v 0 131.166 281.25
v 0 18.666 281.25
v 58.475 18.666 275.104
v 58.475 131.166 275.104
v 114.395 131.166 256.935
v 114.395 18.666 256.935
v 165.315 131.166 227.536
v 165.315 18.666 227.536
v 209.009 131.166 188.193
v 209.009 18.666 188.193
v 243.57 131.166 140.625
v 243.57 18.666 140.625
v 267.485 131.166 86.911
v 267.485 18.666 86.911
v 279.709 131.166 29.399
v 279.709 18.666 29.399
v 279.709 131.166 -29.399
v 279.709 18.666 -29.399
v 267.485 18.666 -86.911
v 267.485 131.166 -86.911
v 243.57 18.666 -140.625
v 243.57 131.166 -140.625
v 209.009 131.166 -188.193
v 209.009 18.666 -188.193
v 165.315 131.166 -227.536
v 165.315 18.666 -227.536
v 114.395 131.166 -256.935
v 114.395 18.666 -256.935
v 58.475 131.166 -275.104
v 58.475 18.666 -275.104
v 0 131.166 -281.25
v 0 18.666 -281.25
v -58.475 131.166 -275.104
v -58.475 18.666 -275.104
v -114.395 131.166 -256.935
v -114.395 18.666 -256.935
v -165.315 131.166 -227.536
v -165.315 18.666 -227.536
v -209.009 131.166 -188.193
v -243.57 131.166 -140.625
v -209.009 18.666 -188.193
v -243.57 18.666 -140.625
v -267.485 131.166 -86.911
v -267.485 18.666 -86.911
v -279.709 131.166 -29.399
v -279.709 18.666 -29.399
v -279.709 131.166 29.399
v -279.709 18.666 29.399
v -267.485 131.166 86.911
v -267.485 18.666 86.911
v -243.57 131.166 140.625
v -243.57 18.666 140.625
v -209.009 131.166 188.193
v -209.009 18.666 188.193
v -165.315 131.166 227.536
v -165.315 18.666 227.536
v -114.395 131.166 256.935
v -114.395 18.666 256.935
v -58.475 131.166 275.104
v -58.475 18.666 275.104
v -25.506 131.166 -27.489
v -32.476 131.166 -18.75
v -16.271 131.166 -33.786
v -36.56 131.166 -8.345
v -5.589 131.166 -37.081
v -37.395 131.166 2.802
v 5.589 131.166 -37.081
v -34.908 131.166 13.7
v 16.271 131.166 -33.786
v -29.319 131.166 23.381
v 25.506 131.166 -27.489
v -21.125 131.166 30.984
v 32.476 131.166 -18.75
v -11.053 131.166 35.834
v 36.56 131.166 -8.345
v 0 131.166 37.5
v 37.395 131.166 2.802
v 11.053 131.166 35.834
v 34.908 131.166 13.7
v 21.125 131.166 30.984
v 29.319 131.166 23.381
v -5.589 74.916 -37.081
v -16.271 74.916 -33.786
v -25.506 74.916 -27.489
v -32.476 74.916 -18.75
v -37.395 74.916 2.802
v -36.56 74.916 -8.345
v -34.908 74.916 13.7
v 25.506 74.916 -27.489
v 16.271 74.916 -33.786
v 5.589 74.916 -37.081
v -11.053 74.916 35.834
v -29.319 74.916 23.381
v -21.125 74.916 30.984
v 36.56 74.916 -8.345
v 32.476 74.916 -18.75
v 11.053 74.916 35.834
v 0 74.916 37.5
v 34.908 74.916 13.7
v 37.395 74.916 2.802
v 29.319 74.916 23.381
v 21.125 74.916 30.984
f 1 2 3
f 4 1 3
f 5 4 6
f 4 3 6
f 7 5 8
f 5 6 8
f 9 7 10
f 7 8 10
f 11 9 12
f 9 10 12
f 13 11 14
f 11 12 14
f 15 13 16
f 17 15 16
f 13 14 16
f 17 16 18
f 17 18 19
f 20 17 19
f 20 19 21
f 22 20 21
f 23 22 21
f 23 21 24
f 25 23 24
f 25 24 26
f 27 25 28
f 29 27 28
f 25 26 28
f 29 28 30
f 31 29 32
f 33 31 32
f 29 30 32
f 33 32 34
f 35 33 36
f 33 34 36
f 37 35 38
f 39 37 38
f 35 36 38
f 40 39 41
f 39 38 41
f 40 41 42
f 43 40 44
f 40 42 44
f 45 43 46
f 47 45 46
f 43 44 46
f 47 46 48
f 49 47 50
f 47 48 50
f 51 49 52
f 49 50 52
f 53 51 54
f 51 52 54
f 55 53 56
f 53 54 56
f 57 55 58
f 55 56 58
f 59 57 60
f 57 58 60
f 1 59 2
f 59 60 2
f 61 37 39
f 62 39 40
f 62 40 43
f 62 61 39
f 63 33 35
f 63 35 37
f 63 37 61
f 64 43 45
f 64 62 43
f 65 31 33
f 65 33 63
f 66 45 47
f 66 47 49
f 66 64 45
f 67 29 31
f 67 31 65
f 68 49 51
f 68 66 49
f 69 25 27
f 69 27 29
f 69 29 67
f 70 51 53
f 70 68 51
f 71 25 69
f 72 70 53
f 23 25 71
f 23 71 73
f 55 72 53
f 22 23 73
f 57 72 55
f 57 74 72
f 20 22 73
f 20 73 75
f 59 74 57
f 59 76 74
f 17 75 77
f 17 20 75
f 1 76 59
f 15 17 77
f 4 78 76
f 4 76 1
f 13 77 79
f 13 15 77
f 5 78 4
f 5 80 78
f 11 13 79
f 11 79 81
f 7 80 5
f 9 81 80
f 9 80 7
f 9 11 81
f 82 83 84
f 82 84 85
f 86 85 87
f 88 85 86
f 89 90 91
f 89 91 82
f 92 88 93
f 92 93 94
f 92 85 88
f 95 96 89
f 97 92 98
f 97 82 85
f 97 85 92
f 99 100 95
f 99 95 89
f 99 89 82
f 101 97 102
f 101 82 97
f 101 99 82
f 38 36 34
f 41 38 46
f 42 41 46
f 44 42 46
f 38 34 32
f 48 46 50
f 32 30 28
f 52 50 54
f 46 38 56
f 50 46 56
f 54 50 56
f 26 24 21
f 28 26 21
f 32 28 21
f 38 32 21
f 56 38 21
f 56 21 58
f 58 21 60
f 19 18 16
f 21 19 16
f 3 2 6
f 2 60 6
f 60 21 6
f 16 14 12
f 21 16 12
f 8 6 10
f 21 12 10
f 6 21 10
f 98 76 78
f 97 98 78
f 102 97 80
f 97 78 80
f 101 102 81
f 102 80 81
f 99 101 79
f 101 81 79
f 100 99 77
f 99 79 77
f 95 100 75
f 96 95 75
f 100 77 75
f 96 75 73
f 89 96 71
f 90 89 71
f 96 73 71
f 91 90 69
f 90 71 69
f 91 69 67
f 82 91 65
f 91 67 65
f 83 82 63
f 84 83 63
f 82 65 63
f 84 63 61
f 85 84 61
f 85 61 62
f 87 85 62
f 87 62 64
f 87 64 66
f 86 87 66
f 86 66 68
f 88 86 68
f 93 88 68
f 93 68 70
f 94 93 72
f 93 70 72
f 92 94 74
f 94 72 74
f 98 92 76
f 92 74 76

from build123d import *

# Parameters (mm, degrees)
SKETCH1_R           = 375
BOSS_EXTRUDE1_DEPTH = 150
SKETCH2_R           = 50
CUT_EXTRUDE1_DEPTH  = 75
SCALE1_SCALE        = 0.75


with BuildPart() as part:
    # Sketch1 → Boss-Extrude1 (new body)
    with BuildSketch(Plane(origin=(0, 0, 0), x_dir=(1, 0, 0), z_dir=(0, 1, 0))):
        with Locations(Location((0, 0, 0), (0, 0, 270))):
            Circle(SKETCH1_R)
    extrude(amount=BOSS_EXTRUDE1_DEPTH)

    # Sketch2 → Cut-Extrude1 (cut)
    with BuildSketch(Plane(origin=(0, 150, 0), x_dir=(1, 0, 0), z_dir=(0, 1, 0))):
        with Locations(Location((0, 0, 0), (0, 0, 270))):
            Circle(SKETCH2_R)
    extrude(amount=-CUT_EXTRUDE1_DEPTH, mode=Mode.SUBTRACT)


with BuildPart() as part_1:
    # Scale1: scaled about (0, 74.66367713, 0)
    add(part.part.scale(SCALE1_SCALE).moved(Location((0, 18.665919282, 0))))


solid = part_1.part
